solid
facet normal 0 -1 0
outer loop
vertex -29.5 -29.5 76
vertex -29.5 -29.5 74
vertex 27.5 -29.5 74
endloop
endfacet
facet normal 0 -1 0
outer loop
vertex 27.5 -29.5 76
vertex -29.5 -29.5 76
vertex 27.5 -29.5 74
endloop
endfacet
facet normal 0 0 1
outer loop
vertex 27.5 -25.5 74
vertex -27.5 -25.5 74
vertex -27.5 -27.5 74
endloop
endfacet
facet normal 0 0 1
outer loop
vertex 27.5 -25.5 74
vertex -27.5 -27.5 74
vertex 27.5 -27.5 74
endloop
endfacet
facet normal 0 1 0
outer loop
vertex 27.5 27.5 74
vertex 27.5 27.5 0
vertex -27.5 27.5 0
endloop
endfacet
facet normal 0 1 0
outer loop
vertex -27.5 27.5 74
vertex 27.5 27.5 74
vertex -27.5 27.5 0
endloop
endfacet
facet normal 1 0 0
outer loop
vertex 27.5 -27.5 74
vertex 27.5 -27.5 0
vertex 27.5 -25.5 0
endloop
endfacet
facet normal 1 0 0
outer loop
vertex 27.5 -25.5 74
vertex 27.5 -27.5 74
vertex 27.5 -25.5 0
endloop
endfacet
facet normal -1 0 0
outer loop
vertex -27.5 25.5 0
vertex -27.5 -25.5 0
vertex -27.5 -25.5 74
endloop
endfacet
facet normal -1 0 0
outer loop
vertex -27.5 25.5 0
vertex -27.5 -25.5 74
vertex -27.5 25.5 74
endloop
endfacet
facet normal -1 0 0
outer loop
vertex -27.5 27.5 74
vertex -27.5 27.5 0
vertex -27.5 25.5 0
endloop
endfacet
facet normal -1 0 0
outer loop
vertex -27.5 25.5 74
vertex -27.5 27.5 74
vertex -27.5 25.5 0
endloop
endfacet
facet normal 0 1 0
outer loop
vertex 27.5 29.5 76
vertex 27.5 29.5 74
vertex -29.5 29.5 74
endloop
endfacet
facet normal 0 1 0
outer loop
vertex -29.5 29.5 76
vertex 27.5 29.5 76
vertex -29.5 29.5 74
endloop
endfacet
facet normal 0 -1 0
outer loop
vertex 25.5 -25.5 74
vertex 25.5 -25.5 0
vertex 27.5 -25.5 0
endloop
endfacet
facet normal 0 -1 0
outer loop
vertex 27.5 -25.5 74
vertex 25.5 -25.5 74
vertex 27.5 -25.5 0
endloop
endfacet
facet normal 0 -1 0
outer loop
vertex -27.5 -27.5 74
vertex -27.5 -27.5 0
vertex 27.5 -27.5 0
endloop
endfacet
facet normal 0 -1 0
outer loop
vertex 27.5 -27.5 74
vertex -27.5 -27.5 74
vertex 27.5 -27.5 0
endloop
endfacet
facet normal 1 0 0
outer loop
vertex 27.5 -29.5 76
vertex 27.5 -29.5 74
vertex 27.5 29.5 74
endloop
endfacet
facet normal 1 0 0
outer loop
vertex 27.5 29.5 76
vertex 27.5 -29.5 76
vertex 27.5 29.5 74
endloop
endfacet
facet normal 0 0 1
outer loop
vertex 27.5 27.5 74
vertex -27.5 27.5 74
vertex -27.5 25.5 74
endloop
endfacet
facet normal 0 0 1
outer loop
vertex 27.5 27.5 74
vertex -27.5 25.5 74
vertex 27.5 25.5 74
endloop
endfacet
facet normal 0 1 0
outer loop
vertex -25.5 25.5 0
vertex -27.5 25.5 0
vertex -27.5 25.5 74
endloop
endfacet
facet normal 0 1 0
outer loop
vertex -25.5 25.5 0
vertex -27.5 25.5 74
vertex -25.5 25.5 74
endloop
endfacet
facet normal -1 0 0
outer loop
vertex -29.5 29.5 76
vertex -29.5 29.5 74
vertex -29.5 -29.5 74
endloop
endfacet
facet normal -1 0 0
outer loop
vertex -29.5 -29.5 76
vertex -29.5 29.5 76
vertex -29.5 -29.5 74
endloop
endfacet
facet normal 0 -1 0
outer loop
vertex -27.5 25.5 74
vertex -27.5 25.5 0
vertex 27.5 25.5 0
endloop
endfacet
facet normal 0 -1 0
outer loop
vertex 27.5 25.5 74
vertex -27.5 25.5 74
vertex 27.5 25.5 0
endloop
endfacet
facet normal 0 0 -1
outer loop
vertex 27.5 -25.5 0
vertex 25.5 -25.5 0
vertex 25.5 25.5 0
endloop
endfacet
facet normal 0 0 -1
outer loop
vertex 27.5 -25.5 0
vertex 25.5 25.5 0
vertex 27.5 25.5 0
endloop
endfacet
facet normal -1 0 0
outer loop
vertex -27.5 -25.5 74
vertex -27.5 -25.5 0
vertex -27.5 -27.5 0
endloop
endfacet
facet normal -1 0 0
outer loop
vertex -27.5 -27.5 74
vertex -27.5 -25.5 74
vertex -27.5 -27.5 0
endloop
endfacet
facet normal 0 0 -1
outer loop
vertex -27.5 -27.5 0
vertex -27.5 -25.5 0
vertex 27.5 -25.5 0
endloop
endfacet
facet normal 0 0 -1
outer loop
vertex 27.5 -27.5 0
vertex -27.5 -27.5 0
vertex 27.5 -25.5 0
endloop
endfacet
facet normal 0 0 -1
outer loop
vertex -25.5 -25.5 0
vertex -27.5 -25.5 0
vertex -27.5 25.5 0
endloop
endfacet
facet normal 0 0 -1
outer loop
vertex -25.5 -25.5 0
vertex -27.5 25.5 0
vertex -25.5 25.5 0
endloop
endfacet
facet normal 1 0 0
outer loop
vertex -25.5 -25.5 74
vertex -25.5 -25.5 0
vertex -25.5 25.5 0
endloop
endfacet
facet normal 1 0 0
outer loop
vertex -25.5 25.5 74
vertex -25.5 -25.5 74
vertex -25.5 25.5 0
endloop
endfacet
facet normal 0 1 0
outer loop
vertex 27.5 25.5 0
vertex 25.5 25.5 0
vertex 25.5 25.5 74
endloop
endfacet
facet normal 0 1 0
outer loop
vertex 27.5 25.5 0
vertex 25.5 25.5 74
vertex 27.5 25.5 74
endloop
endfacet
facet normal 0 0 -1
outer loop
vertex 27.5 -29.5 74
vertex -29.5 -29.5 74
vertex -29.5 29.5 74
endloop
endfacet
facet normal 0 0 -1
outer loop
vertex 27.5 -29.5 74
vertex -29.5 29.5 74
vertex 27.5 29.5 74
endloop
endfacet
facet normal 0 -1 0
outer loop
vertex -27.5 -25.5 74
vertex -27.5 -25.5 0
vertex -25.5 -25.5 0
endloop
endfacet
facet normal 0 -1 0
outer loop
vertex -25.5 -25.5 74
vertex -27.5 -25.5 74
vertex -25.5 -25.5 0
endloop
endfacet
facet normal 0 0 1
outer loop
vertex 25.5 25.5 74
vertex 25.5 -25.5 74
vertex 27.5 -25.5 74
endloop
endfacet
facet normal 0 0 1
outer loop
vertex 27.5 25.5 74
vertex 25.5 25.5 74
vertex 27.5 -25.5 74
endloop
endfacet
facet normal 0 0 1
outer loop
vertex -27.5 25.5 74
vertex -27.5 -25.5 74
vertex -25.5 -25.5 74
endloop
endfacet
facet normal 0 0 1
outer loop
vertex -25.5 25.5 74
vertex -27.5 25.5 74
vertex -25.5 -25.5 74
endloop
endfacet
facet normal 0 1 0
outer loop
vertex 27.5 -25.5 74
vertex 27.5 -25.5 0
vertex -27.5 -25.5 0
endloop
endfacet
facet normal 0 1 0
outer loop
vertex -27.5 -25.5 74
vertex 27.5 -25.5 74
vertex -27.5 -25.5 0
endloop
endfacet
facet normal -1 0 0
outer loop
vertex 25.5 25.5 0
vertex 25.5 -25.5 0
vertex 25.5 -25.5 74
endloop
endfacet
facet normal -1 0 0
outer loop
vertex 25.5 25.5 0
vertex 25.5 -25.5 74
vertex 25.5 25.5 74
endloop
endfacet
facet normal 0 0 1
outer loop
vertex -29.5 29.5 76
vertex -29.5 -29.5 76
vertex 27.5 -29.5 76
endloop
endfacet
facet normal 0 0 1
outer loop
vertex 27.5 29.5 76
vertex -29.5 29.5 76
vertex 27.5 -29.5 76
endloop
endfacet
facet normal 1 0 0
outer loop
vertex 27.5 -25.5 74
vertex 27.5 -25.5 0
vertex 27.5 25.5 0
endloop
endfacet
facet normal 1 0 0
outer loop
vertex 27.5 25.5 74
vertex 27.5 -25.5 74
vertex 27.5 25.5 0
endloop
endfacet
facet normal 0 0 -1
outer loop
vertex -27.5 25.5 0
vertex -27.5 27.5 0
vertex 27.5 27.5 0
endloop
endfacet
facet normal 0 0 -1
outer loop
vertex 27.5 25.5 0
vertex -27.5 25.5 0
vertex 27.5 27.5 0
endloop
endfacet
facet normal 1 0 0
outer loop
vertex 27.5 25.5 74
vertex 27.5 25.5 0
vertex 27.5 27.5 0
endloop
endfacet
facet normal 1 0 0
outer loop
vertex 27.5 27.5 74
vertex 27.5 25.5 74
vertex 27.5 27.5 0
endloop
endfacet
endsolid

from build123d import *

# Parameters (mm, degrees)
F1_DEPTH = 74
F0_W     = 2
F0_H     = 51
F2_DEPTH = 74
F3_DEPTH = 74
F4_DEPTH = 74
F7_DEPTH = 2


with BuildPart() as f1:
    # F0 (on Top) → F1 (new body)
    with BuildSketch(Plane.XY):
        Polygon((27.5, 27.5), (-27.5, 27.5), (-27.5, 25.5), (-25.5, 25.5), (25.5, 25.5), (27.5, 25.5), align=None)
    extrude(amount=F1_DEPTH)


with BuildPart() as f2:
    # F0 (on Top) → F2 (new body)
    with BuildSketch(Plane.XY):
        with Locations((-26.5, 0)):
            Rectangle(F0_W, F0_H)
    extrude(amount=F2_DEPTH)


with BuildPart() as f3:
    # F0 (on Top) → F3 (new body)
    with BuildSketch(Plane.XY):
        Polygon((-25.5, -25.5), (-27.5, -25.5), (-27.5, -27.5), (27.5, -27.5), (27.5, -25.5), (25.5, -25.5), align=None)
    extrude(amount=F3_DEPTH)


with BuildPart() as f4:
    # F0 (on Top) → F4 (new body)
    with BuildSketch(Plane.XY):
        with Locations((26.5, 0)):
            Rectangle(F0_W, F0_H)
    extrude(amount=F4_DEPTH)


with BuildPart() as f7:
    # F6 (on offset) → F7 (new body)
    with BuildSketch(Plane.XY.offset(74)):
        Polygon((27.5, -27.5), (27.5, 27.5), (27.5, 29.5), (-29.5, 29.5), (-29.5, -29.5), (27.5, -29.5), align=None)
    extrude(amount=F7_DEPTH)


solid = Compound([f1.part, f2.part, f3.part, f4.part, f7.part])
